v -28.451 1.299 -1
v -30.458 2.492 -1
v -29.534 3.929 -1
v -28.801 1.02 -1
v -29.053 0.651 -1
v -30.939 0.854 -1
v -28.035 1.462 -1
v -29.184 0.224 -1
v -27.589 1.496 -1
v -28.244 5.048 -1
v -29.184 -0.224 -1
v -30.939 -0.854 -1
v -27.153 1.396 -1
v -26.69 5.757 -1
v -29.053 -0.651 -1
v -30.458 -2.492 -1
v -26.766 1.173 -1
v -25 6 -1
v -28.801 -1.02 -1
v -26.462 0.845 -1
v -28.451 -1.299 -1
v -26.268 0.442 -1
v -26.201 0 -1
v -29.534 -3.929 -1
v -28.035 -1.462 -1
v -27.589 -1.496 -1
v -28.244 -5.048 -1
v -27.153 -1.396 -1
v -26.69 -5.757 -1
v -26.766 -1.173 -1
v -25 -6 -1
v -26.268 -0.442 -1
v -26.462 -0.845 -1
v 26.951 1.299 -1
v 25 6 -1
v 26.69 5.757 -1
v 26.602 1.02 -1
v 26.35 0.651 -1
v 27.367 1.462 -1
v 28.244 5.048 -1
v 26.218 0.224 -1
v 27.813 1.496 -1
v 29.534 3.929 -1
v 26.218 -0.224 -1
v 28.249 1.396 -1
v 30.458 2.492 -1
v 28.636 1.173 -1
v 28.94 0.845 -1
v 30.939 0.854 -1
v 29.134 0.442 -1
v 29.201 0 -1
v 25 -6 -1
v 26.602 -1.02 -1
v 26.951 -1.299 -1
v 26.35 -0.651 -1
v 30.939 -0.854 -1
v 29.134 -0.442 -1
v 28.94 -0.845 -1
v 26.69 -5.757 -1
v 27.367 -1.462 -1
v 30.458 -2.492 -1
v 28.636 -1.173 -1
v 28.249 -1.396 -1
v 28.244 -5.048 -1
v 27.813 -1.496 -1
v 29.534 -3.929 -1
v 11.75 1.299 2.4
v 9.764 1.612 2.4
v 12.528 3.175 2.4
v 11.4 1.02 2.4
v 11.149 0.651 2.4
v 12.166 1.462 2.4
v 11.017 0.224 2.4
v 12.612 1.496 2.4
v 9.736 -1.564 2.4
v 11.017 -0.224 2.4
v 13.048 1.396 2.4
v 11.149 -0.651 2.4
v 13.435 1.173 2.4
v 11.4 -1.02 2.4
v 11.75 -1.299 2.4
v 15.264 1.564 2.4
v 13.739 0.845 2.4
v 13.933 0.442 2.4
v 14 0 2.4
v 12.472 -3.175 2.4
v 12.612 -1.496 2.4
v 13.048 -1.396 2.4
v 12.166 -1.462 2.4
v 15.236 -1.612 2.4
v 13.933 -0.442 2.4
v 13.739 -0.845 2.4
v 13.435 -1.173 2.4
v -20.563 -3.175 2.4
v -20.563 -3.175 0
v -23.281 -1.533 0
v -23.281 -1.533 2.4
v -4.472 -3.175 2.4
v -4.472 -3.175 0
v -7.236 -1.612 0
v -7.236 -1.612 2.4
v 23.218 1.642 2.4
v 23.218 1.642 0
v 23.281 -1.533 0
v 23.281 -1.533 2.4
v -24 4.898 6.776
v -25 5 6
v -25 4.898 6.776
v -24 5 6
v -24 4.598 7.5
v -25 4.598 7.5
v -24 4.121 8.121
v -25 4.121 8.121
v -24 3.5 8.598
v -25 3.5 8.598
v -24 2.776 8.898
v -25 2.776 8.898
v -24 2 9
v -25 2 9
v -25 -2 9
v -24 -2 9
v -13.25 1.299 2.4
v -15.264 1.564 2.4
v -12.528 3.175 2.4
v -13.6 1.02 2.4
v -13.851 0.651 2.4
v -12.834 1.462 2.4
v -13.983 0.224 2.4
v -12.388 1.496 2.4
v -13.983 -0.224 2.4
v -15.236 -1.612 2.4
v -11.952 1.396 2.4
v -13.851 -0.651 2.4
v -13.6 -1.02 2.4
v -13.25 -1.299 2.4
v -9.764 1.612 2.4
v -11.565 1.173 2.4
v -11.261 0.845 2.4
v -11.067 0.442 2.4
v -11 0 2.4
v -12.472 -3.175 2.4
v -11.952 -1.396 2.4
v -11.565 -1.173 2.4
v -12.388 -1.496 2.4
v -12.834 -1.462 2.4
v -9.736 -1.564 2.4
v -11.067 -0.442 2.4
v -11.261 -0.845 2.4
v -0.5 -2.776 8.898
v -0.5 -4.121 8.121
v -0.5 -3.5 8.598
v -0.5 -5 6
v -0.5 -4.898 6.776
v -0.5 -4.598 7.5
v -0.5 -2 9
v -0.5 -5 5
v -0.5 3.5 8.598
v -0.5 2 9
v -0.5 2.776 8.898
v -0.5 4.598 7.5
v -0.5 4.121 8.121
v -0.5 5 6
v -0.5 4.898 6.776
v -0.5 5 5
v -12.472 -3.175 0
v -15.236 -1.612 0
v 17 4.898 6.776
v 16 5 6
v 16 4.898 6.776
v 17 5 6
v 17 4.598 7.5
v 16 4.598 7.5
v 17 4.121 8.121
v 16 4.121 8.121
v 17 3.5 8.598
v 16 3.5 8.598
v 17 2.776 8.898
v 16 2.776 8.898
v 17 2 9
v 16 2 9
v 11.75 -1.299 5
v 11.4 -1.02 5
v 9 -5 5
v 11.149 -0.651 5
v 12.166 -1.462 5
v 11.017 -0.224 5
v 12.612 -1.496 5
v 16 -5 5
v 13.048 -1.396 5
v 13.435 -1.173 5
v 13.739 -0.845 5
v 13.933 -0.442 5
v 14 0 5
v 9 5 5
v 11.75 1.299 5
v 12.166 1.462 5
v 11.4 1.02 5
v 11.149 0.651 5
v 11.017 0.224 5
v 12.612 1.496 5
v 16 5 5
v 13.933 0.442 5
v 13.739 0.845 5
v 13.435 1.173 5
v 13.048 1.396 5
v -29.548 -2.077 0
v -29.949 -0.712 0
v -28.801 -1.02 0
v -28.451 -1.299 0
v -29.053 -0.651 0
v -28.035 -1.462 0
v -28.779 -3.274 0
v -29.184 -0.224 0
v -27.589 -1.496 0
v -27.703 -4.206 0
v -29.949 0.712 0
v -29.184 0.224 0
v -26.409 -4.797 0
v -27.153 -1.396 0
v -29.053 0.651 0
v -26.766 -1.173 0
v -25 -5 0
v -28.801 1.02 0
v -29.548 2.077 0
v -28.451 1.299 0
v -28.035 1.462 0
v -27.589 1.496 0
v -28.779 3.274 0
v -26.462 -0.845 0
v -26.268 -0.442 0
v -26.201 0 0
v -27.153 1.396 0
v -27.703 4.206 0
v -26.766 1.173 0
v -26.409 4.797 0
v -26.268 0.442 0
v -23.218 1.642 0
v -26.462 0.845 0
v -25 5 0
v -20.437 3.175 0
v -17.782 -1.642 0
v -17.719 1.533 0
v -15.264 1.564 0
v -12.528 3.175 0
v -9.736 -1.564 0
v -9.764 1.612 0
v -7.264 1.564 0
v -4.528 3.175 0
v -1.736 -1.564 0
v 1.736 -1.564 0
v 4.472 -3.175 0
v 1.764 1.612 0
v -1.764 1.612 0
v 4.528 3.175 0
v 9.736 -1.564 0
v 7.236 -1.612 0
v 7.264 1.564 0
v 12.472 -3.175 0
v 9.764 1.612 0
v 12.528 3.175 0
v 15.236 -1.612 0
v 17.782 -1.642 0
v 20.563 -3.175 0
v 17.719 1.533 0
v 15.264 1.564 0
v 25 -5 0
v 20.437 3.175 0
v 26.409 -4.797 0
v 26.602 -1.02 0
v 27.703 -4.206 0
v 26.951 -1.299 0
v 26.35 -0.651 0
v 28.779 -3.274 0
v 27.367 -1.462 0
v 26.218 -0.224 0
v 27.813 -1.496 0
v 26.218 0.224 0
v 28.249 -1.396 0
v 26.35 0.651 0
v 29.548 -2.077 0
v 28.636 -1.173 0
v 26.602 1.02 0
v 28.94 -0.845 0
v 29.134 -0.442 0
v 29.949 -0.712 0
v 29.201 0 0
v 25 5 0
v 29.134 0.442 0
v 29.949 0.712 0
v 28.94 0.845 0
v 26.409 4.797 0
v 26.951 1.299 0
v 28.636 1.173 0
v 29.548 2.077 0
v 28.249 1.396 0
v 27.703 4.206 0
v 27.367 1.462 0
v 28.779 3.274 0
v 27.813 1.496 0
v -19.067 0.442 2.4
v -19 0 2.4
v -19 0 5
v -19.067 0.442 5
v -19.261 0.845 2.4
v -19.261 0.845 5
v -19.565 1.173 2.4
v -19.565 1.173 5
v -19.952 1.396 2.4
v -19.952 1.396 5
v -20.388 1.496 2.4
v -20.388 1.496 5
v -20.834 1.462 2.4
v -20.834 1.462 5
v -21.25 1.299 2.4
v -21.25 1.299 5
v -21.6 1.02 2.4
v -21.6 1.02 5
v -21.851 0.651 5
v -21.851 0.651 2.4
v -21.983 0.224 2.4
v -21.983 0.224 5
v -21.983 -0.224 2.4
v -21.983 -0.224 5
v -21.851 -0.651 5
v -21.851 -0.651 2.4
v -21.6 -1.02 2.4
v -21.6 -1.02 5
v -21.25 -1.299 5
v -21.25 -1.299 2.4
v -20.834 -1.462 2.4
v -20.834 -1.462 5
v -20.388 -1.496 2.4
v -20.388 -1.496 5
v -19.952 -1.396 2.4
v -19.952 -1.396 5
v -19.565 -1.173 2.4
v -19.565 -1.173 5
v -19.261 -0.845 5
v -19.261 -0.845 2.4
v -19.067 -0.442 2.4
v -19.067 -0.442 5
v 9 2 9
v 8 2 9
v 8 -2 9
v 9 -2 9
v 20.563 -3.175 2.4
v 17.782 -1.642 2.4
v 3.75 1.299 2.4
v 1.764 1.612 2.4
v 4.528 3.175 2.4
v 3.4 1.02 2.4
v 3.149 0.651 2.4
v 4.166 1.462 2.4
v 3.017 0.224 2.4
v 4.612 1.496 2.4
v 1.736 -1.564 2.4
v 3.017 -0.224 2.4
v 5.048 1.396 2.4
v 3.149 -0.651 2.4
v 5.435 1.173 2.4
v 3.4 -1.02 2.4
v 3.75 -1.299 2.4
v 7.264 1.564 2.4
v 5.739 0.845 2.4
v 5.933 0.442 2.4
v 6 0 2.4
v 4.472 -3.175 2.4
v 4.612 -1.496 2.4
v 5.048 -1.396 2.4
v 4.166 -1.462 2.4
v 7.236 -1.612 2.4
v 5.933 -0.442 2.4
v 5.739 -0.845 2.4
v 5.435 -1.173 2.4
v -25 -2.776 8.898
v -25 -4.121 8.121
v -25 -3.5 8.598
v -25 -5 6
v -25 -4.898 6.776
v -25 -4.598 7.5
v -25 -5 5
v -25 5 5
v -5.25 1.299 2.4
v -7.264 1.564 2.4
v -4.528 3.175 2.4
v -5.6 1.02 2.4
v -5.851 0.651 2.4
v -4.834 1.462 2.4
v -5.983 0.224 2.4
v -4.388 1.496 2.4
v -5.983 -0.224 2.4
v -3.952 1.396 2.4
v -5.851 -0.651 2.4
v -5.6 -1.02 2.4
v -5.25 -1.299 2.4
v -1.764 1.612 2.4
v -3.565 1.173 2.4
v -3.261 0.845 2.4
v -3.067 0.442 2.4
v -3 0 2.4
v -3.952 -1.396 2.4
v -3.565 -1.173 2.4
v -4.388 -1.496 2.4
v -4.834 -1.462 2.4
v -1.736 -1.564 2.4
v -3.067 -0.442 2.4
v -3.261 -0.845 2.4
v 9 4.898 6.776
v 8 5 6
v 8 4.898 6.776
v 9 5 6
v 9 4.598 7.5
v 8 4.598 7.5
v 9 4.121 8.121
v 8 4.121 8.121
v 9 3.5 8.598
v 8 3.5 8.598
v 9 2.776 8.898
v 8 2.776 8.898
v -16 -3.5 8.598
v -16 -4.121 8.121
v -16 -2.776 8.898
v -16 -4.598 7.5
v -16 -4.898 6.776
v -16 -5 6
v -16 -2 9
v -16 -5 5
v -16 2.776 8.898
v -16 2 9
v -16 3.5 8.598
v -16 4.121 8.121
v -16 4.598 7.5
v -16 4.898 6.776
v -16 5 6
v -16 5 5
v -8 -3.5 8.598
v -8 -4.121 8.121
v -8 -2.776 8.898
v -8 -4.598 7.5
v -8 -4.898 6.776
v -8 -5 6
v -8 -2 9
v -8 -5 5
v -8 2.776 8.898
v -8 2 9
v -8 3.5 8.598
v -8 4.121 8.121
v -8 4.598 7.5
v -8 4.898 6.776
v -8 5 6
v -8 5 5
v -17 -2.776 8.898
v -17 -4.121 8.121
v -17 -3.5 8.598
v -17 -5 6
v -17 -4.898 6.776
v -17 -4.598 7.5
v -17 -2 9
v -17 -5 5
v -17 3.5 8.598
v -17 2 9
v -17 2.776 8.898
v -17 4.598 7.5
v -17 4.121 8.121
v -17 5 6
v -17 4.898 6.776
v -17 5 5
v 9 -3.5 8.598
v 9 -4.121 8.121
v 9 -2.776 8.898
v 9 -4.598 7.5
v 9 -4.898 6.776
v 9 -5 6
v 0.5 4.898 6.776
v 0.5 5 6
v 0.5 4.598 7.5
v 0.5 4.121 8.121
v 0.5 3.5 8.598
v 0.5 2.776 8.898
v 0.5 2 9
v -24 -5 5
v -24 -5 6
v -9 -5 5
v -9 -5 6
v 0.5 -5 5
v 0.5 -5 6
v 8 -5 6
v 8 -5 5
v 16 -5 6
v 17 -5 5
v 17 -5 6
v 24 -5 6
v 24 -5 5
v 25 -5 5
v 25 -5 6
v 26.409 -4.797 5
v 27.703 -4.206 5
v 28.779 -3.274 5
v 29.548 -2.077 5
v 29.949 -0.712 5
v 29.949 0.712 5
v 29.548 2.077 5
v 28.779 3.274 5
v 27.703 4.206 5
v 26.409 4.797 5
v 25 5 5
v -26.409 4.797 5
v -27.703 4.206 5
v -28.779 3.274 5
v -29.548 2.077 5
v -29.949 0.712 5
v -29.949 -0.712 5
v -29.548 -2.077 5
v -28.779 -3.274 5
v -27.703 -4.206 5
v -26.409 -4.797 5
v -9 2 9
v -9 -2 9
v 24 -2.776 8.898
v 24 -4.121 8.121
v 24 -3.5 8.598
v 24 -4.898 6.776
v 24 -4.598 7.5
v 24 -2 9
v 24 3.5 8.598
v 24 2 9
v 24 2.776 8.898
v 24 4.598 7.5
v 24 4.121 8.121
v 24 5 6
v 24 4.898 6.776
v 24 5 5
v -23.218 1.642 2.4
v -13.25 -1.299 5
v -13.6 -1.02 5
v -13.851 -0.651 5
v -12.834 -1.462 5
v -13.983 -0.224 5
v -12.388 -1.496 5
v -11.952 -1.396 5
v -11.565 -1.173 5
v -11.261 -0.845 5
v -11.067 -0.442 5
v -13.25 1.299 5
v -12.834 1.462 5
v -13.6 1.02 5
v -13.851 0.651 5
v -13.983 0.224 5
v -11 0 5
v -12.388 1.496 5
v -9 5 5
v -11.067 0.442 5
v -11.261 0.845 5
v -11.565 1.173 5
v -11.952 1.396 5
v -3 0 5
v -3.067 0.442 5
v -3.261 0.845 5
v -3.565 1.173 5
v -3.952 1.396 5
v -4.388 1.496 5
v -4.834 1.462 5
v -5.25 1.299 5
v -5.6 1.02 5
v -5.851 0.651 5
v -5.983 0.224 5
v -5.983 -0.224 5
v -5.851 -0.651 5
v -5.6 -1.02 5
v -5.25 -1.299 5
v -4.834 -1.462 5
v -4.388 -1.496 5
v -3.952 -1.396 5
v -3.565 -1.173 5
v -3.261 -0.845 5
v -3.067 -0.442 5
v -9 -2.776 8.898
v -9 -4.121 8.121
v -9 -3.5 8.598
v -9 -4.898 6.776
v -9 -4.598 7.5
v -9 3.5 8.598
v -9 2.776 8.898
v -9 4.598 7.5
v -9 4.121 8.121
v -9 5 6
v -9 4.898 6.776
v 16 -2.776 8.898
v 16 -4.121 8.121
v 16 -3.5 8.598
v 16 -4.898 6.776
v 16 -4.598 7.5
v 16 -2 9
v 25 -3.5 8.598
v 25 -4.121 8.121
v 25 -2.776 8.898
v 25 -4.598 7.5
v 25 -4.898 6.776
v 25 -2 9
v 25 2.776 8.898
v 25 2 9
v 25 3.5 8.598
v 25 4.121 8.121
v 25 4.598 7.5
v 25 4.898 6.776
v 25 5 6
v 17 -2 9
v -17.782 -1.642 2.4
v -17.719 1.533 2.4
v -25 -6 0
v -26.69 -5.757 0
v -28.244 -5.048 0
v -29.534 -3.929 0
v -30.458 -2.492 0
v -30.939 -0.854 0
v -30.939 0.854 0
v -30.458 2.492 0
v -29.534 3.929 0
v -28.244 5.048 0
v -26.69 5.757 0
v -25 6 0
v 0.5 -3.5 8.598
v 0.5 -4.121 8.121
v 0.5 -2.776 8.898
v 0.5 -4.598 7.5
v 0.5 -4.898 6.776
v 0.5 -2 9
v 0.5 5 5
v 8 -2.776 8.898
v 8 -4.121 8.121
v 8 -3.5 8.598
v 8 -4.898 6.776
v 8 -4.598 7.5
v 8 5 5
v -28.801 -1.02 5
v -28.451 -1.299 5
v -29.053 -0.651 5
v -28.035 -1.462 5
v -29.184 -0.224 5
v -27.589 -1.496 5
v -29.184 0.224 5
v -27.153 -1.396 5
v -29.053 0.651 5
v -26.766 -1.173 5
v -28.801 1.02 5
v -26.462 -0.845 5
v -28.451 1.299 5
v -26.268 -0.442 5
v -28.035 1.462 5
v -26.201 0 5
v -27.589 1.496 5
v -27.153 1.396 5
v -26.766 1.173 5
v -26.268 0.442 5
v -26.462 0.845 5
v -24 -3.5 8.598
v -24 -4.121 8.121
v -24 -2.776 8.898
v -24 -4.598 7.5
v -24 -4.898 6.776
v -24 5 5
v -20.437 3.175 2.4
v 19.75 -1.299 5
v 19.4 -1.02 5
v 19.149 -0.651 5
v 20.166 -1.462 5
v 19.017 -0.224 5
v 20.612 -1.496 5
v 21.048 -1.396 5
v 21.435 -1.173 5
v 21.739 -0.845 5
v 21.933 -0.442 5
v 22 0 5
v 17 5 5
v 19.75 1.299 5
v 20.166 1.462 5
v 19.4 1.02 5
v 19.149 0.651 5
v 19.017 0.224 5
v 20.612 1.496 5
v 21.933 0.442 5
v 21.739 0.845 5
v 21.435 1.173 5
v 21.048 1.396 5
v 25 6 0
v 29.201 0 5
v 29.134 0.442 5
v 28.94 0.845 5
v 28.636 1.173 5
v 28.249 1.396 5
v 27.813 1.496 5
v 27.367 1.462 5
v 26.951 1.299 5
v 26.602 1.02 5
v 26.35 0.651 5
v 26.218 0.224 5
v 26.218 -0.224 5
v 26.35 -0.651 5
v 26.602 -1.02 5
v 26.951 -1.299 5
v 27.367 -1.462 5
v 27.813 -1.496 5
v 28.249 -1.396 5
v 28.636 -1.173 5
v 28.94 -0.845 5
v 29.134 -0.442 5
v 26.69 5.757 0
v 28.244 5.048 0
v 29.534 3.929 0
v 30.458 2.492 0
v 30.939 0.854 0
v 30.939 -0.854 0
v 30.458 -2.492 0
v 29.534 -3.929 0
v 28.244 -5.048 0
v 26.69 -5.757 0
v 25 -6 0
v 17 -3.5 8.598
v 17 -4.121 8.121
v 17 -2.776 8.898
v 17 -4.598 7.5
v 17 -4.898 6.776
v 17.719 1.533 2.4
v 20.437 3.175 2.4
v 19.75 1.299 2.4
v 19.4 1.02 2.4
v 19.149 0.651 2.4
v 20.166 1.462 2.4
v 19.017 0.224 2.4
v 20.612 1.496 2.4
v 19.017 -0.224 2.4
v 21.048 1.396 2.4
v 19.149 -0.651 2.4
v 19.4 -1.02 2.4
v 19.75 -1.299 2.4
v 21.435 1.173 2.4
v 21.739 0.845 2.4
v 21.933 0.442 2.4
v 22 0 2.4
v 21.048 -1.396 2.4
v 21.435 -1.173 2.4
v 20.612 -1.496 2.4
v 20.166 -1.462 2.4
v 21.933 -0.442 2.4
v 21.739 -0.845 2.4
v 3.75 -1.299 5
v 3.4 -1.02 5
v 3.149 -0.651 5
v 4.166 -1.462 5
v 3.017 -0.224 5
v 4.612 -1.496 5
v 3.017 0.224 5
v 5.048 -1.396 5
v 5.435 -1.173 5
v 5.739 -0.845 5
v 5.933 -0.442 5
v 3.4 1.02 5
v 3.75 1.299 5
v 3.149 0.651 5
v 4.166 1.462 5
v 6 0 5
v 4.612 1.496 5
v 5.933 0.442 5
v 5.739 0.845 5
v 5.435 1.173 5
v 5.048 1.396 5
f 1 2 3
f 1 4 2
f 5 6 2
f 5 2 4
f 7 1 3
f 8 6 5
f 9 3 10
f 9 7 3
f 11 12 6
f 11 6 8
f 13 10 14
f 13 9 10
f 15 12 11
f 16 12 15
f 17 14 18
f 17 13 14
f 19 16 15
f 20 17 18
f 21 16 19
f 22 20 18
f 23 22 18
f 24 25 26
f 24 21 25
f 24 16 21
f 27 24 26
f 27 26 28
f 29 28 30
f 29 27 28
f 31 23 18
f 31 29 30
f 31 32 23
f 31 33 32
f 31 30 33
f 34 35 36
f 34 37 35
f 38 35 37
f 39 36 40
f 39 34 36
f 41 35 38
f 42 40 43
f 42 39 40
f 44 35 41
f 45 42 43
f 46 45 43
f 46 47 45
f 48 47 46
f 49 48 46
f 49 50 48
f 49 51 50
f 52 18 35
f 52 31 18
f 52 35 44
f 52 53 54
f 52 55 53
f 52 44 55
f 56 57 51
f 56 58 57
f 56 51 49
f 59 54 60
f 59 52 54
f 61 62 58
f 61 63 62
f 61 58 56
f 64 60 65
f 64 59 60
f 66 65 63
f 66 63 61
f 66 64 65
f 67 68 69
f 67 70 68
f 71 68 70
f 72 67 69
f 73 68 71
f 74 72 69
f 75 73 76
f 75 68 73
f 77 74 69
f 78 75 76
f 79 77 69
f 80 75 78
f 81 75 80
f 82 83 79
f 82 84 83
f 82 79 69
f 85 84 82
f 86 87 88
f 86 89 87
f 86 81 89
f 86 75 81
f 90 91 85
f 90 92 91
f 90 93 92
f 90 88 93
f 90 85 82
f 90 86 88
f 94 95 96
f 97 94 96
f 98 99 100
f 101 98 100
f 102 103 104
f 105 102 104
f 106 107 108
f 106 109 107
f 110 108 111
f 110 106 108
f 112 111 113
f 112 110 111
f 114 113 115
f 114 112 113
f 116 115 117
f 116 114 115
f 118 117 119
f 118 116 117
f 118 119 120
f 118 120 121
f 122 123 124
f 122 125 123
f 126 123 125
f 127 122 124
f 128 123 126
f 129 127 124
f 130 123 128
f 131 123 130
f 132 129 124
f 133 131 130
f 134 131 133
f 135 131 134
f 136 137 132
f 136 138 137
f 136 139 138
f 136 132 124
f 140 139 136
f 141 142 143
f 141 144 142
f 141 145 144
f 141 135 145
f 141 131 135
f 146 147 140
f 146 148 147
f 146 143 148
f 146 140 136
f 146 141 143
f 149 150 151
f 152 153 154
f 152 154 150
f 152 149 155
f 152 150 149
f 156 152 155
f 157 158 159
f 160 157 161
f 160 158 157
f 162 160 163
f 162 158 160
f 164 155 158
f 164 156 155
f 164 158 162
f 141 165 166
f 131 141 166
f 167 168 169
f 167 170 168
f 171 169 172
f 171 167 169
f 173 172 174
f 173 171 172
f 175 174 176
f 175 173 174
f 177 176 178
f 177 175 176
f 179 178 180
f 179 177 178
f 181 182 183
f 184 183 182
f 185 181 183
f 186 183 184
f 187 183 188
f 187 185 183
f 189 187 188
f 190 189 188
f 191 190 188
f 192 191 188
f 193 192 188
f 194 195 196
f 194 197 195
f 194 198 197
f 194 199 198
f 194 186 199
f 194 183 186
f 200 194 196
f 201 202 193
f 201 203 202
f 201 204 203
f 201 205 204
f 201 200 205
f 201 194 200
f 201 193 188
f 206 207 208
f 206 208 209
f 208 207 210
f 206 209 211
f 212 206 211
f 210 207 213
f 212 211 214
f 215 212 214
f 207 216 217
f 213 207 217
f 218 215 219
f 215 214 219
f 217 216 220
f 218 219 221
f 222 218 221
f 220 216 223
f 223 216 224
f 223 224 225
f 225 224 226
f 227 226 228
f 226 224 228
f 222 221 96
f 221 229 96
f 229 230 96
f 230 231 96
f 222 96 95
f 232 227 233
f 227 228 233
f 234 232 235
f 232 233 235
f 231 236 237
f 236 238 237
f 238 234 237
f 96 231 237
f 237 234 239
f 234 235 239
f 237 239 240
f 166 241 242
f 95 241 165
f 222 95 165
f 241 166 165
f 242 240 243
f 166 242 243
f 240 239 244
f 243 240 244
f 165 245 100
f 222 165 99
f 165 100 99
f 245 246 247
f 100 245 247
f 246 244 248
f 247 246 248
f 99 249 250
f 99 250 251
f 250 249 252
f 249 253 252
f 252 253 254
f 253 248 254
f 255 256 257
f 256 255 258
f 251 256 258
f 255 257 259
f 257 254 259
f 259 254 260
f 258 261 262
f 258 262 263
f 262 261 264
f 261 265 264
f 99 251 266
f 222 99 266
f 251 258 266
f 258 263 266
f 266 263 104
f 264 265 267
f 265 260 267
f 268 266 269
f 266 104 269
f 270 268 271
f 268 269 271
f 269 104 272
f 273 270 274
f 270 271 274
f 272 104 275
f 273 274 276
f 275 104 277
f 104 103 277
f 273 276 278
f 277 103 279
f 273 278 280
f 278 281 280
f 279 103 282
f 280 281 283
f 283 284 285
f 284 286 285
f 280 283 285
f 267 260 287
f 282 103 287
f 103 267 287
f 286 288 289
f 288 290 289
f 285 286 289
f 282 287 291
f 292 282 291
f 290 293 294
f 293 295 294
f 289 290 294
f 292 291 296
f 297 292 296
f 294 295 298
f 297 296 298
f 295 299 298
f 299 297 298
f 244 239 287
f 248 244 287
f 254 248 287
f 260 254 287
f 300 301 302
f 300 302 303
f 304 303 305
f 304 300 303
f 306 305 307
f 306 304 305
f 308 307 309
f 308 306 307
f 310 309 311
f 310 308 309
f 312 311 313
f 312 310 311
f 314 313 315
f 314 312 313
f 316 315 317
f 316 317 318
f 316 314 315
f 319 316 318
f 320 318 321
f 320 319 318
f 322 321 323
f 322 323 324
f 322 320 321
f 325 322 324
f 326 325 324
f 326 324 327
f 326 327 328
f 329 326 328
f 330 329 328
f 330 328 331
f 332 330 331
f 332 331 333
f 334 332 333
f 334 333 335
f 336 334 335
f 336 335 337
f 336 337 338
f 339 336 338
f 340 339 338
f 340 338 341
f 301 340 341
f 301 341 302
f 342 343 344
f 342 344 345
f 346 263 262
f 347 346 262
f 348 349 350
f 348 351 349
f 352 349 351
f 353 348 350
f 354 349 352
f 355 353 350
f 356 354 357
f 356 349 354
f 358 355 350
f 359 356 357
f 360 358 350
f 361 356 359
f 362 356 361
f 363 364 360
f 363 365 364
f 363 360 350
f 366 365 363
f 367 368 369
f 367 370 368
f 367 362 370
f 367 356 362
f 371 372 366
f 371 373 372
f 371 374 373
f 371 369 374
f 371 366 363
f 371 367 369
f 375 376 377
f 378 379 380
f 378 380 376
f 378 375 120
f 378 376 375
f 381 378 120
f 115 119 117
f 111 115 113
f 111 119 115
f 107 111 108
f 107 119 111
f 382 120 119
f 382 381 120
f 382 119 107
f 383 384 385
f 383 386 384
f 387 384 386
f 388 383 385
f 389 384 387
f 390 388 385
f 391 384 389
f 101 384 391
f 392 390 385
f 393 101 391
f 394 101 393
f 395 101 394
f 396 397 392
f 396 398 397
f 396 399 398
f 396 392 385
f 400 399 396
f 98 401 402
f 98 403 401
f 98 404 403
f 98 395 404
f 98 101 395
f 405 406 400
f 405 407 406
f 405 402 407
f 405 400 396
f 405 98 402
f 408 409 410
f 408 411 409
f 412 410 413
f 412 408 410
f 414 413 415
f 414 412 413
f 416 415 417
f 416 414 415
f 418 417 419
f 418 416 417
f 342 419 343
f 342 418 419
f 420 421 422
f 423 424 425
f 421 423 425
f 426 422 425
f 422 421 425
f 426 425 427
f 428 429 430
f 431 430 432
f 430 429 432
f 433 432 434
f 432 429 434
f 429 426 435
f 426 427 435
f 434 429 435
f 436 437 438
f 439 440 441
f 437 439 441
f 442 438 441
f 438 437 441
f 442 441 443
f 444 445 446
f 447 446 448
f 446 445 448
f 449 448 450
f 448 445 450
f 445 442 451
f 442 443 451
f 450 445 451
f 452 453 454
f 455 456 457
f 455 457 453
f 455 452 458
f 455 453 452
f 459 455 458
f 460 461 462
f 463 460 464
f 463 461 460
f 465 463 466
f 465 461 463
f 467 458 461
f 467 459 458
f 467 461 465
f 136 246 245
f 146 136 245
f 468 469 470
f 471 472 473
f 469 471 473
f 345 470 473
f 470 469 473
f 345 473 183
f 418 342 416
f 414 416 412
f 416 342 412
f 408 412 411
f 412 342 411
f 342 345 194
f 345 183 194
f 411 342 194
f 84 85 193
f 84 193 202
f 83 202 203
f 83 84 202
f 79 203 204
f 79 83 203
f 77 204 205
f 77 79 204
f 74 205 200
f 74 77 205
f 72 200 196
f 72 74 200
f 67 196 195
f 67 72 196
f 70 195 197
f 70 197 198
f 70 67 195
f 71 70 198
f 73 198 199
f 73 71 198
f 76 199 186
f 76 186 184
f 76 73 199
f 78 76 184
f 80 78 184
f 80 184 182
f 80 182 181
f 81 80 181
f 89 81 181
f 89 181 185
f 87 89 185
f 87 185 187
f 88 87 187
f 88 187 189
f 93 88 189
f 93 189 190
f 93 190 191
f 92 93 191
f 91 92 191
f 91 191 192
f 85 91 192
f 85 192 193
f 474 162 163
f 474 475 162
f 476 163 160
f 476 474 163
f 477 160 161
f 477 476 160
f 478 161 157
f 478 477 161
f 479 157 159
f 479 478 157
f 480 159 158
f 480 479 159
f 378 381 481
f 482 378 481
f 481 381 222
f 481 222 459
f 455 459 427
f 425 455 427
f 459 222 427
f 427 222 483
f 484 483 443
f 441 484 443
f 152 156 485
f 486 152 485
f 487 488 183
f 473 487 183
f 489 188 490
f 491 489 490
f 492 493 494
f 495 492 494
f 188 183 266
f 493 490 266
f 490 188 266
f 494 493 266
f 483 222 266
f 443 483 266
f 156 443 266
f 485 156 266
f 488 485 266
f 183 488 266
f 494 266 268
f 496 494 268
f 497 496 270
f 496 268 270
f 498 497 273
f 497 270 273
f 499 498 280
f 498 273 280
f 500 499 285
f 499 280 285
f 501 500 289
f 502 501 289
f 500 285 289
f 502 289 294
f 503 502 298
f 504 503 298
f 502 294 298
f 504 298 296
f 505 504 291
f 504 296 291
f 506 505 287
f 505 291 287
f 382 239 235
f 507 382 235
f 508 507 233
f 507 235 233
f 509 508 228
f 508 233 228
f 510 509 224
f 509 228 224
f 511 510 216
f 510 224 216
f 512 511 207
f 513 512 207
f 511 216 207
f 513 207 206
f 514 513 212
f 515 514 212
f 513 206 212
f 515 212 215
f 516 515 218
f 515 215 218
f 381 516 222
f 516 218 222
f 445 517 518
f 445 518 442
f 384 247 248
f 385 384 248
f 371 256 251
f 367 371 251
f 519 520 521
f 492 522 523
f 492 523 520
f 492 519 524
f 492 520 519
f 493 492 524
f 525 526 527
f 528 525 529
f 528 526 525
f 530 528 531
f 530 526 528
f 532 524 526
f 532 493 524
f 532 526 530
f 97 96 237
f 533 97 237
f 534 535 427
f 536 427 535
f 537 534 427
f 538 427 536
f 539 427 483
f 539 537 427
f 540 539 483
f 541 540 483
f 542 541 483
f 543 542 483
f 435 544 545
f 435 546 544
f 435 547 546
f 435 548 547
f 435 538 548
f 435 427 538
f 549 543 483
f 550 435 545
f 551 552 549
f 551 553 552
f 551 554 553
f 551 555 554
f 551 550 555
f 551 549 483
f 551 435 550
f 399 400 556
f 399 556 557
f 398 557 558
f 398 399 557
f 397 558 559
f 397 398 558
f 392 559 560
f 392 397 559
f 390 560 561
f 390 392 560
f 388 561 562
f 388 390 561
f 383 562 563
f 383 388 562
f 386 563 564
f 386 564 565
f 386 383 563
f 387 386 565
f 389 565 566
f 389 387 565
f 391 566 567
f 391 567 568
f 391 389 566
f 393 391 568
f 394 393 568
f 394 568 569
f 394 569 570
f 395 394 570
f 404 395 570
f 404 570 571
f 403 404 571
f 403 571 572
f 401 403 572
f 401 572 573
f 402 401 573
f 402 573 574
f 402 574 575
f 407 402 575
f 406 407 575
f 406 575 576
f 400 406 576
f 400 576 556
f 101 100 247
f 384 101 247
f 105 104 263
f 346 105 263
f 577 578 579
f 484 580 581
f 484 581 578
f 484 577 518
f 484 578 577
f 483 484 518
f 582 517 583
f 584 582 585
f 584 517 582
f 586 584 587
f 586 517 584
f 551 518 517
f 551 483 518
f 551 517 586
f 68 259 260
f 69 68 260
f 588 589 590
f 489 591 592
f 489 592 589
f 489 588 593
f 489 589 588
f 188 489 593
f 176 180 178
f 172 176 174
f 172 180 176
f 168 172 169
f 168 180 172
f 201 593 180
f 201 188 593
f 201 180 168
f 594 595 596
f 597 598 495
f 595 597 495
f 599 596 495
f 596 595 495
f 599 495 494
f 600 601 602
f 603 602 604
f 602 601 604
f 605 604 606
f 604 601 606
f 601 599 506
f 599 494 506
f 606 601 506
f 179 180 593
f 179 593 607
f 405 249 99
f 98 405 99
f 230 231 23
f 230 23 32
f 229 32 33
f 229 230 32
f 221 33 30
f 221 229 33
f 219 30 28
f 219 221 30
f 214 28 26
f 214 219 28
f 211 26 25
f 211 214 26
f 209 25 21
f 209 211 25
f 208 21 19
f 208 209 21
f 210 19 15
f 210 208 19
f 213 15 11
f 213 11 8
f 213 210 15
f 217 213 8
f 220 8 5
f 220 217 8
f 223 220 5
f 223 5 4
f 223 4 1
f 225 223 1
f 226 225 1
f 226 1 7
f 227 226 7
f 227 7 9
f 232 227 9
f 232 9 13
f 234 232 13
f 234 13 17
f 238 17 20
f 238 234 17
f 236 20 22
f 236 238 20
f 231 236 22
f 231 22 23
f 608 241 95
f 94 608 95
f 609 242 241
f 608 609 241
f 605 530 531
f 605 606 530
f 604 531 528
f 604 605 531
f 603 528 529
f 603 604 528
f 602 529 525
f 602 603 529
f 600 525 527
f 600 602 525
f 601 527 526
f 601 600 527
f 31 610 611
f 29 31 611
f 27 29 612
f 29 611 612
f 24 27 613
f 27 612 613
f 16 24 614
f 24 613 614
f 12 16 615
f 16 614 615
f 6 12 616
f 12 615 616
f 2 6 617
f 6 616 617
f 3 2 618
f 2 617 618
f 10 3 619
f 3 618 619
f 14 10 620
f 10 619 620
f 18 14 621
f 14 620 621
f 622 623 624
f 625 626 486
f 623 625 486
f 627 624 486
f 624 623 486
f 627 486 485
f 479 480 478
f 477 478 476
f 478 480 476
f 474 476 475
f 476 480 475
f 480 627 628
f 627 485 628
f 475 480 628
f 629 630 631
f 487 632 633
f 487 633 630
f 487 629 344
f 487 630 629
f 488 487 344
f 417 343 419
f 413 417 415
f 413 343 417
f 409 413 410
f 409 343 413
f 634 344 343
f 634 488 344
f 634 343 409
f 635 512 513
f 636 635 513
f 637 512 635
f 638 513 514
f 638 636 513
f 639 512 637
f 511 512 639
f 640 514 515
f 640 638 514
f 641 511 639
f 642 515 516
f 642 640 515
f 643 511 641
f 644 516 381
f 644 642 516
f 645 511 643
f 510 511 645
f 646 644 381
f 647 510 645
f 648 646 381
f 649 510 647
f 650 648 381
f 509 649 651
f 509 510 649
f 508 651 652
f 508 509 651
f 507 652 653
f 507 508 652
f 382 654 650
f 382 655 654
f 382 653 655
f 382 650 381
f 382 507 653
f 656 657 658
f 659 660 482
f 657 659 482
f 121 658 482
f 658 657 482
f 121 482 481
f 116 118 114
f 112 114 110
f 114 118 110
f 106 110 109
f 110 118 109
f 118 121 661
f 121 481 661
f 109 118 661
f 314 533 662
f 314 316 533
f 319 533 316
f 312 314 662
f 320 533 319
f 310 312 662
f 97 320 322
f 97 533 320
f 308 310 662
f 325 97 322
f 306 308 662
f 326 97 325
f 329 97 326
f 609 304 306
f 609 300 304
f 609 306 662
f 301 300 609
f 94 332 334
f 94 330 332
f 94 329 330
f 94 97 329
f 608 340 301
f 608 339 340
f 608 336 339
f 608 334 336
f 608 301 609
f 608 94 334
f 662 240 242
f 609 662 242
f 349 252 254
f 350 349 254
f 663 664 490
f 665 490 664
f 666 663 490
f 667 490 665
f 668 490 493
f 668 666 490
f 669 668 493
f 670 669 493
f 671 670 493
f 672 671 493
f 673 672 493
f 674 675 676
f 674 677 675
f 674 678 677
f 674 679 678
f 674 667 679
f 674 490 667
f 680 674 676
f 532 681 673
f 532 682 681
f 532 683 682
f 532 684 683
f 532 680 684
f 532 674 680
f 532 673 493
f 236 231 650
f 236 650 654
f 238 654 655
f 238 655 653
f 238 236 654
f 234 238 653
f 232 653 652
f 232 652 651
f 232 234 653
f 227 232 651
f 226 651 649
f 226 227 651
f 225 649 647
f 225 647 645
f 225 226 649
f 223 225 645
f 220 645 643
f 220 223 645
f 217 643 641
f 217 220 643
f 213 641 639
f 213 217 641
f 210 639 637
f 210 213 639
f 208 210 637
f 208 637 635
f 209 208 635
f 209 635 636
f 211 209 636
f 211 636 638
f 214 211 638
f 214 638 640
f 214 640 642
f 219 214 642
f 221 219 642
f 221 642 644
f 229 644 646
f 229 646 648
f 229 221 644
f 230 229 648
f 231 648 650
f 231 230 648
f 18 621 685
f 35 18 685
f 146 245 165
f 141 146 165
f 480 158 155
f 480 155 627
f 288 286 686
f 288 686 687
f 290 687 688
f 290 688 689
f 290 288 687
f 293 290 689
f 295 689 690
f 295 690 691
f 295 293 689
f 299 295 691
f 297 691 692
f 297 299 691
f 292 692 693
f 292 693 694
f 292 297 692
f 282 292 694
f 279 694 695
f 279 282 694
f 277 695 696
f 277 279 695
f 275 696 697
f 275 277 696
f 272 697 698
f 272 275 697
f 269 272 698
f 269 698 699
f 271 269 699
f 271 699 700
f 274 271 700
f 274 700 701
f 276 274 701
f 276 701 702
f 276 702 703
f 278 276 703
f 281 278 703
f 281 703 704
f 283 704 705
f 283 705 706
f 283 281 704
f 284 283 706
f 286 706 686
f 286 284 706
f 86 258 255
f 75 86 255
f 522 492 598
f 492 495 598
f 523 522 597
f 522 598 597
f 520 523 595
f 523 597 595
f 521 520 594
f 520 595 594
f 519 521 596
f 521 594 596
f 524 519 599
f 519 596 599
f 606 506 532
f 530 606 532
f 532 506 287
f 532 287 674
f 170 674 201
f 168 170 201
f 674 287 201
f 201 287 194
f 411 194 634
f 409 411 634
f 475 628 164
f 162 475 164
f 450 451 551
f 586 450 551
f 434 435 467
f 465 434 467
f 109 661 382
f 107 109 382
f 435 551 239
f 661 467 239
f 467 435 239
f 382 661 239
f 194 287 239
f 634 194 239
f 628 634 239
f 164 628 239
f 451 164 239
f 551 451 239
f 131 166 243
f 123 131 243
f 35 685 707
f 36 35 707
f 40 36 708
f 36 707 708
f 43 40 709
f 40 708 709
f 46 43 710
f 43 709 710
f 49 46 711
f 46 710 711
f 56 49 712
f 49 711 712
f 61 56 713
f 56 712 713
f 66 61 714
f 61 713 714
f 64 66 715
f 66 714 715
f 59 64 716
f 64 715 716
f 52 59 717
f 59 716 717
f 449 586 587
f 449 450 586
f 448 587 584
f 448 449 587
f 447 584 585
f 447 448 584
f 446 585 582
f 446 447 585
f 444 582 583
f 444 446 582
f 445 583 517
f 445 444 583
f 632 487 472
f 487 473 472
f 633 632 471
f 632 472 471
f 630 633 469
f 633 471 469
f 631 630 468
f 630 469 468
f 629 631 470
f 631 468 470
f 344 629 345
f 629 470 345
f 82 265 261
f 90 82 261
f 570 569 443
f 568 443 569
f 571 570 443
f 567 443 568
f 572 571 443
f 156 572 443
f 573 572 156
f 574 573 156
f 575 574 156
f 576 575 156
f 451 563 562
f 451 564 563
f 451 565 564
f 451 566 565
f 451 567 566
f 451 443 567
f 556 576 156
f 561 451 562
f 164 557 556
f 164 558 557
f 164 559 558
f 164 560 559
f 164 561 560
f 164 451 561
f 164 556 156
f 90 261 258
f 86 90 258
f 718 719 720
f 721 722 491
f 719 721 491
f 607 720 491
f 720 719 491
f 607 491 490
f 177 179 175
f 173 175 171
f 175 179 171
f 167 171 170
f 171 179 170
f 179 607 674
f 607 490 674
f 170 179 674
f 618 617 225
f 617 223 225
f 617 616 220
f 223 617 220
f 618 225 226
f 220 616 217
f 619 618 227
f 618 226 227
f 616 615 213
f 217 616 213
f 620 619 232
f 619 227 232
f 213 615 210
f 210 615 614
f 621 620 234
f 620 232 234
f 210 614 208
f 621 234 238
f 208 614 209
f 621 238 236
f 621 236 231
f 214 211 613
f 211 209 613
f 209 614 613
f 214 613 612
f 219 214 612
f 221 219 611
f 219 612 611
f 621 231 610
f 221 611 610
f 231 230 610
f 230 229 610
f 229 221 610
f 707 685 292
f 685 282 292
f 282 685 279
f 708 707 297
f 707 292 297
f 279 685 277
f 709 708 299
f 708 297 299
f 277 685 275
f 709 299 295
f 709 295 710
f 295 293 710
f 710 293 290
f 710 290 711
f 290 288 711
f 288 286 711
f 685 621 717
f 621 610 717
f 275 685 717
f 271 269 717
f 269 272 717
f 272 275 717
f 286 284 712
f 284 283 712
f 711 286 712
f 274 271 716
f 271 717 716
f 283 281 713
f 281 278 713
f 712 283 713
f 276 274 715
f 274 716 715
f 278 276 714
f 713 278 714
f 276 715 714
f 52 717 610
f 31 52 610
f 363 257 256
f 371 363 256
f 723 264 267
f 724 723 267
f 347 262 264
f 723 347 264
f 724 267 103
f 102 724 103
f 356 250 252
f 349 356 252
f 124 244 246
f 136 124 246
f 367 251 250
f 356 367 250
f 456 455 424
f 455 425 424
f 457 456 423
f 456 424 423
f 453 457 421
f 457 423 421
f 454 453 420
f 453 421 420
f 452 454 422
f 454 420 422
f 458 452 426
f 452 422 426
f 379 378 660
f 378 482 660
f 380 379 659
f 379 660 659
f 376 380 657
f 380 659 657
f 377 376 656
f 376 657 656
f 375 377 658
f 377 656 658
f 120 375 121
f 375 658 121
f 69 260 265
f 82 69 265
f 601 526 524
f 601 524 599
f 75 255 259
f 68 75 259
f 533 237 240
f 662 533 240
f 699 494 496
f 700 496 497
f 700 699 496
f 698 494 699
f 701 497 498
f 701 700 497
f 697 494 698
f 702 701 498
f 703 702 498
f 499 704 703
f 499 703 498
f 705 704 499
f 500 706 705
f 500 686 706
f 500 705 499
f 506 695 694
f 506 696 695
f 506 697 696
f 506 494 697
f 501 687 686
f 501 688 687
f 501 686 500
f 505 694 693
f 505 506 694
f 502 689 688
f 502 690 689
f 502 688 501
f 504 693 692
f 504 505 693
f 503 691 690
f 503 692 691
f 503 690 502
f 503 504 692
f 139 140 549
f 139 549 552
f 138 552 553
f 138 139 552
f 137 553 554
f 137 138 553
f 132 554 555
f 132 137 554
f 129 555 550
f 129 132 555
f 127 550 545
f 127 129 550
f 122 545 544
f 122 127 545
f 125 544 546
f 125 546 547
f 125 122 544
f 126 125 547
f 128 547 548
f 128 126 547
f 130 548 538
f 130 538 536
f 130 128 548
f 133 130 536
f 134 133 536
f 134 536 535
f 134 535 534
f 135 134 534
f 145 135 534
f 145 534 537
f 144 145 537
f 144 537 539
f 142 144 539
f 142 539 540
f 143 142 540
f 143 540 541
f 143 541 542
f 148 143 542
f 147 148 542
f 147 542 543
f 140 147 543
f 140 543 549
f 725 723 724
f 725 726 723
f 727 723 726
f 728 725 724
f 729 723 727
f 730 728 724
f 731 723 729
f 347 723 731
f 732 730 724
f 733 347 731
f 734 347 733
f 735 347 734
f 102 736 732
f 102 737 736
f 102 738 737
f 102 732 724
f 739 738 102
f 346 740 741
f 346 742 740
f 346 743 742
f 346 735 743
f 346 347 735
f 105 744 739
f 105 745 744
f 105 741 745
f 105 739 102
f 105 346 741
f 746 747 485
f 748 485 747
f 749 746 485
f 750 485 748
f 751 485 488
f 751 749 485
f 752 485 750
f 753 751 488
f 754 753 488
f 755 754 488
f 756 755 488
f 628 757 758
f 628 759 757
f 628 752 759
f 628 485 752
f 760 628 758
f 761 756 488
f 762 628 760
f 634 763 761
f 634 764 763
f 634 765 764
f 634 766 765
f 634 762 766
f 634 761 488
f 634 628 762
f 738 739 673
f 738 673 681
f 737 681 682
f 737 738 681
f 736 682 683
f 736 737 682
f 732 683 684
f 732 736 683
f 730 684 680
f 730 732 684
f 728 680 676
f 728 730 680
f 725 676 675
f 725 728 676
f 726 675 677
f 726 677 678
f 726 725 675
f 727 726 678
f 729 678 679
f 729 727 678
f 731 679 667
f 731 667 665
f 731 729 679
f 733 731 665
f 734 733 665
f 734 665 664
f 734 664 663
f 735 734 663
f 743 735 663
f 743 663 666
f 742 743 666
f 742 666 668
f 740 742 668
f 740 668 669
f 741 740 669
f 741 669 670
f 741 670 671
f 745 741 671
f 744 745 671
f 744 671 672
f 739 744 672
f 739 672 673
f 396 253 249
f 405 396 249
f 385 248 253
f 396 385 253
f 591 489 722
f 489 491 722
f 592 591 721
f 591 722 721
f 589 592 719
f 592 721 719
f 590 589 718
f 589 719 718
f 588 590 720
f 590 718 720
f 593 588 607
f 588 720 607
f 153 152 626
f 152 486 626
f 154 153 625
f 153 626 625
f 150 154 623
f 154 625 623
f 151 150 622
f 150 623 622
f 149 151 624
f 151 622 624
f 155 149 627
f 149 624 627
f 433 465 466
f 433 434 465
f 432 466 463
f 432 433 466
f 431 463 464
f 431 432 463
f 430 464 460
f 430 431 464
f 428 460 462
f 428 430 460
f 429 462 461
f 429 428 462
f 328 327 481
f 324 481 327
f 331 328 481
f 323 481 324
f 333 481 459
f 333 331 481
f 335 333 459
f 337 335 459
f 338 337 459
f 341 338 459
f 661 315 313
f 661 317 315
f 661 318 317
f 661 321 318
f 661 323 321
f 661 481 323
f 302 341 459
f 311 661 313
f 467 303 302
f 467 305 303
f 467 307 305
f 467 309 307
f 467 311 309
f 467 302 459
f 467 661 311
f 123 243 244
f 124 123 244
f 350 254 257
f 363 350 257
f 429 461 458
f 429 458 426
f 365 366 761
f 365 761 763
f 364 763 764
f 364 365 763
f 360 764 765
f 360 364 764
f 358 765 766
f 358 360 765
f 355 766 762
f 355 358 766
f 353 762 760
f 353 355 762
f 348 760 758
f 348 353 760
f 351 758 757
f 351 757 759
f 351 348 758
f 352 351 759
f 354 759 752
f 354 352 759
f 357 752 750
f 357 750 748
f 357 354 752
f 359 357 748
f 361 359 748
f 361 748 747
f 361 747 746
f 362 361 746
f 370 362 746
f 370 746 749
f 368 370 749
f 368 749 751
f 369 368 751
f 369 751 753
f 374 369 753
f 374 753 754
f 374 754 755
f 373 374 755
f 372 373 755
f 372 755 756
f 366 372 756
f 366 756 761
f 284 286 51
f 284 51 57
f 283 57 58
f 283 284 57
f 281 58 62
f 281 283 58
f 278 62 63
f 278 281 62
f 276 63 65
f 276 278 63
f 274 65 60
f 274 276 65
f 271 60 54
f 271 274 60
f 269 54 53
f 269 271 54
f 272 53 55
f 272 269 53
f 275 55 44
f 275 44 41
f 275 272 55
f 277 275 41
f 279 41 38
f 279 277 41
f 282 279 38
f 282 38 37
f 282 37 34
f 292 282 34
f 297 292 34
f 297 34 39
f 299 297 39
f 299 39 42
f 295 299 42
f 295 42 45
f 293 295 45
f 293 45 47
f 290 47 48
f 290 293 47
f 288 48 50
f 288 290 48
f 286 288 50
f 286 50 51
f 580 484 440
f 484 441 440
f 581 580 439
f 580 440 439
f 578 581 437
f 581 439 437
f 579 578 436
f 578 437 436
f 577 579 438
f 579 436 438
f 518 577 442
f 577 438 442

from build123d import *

# Parameters (mm, degrees)
F0_R     = 1.5
F0_W     = 1
F0_H     = 10
F0_W_2   = 7
F0_W_3   = 7.5
F1_DEPTH = 5
F2_DEPTH = 9
F3_R     = 3
F5_DEPTH = 2.4
F6_R     = 1.5
F7_DEPTH = 1


with BuildPart() as f1:
    # F0 (on Top) → F1 (new body)
    with BuildSketch(Plane.XY):
        with BuildLine():
            Line((25, 5), (25, -5))
            ThreePointArc((25, -5), (30, 0), (25, 5))
        make_face()
        with Locations((27.7011040598, 0)):
            Circle(F0_R, mode=Mode.SUBTRACT)
        with Locations((24.5, 0)):
            Rectangle(F0_W, F0_H)
        with Locations((20.5, 0)):
            Rectangle(F0_W_2, F0_H)
        with Locations((20.5, 0)):
            Circle(F0_R, mode=Mode.SUBTRACT)
        with Locations((16.5, 0)):
            Rectangle(F0_W, F0_H)
        with Locations((12.5, 0)):
            Rectangle(F0_W_2, F0_H)
        with Locations((12.5, 0)):
            Circle(F0_R, mode=Mode.SUBTRACT)
        with Locations((8.5, 0)):
            Rectangle(F0_W, F0_H)
        with Locations((4.25, 0)):
            Rectangle(F0_W_3, F0_H)
        with Locations((4.5, 0)):
            Circle(F0_R, mode=Mode.SUBTRACT)
        Rectangle(F0_W, F0_H)
        with Locations((-4.25, 0)):
            Rectangle(F0_W_3, F0_H)
        with Locations((-4.5, 0)):
            Circle(F0_R, mode=Mode.SUBTRACT)
        with Locations((-8.5, 0)):
            Rectangle(F0_W, F0_H)
        with Locations((-12.5, 0)):
            Rectangle(F0_W_2, F0_H)
        with Locations((-12.5, 0)):
            Circle(F0_R, mode=Mode.SUBTRACT)
        with Locations((-16.5, 0)):
            Rectangle(F0_W, F0_H)
        with Locations((-20.5, 0)):
            Rectangle(F0_W_2, F0_H)
        with Locations((-20.5, 0)):
            Circle(F0_R, mode=Mode.SUBTRACT)
        with Locations((-24.5, 0)):
            Rectangle(F0_W, F0_H)
        with BuildLine():
            ThreePointArc((-25, 5), (-30, 0), (-25, -5))
            Line((-25, -5), (-25, 5))
        make_face()
        with Locations((-27.7011040598, 0)):
            Circle(F0_R, mode=Mode.SUBTRACT)
    extrude(amount=F1_DEPTH)

    # F0 (on Top) → F2 (join)
    with BuildSketch(Plane.XY):
        with Locations((-24.5, 0)):
            Rectangle(F0_W, F0_H)
        with Locations((-16.5, 0)):
            Rectangle(F0_W, F0_H)
        with Locations((-8.5, 0)):
            Rectangle(F0_W, F0_H)
        Rectangle(F0_W, F0_H)
        with Locations((8.5, 0)):
            Rectangle(F0_W, F0_H)
        with Locations((16.5, 0)):
            Rectangle(F0_W, F0_H)
        with Locations((24.5, 0)):
            Rectangle(F0_W, F0_H)
    extrude(amount=F2_DEPTH)

    # F3
    f3_edges = [f1.edges().sort_by_distance(p)[0] for p in [
        (-24.5, -5, 9),
        (-16.5, -5, 9),
        (-8.5, -5, 9),
        (0, -5, 9),
        (8.5, -5, 9),
        (16.5, -5, 9),
        (24.5, -5, 9),
        (24.5, 5, 9),
        (16.5, 5, 9),
        (8.5, 5, 9),
        (0, 5, 9),
        (-8.5, 5, 9),
        (-16.5, 5, 9),
        (-24.5, 5, 9),
    ]]
    fillet(f3_edges, radius=F3_R)

    # F4 (on face) → F5 (cut)
    with BuildSketch(Plane(origin=(0, 0, 0), x_dir=(1, 0, 0), z_dir=(0, 0, -1))):
        Polygon((-20.4367463733, -3.1747964206), (-17.7189188346, -1.5326189627), (-17.7821724613, 1.6421774579), (-20.5632536267, 3.1747964206), (-23.2810811654, 1.5326189627), (-23.2178275387, -1.6421774579), align=None)
        Polygon((-12.5275420892, -3.175307035), (-9.7638744875, -1.6115056665), (-9.7363323982, 1.5638013686), (-12.4724579108, 3.175307035), (-15.2361255125, 1.6115056665), (-15.2636676018, -1.5638013686), align=None)
        Polygon((-4.5275420892, -3.175307035), (-1.7638744875, -1.6115056665), (-1.7363323982, 1.5638013686), (-4.4724579108, 3.175307035), (-7.2361255125, 1.6115056665), (-7.2636676018, -1.5638013686), align=None)
        Polygon((23.2178275387, -1.6421774579), (23.2810811654, 1.5326189627), (20.5632536267, 3.1747964206), (17.7821724613, 1.6421774579), (17.7189188346, -1.5326189627), (20.4367463733, -3.1747964206), align=None)
        Polygon((15.2636676018, -1.5638013686), (15.2361255125, 1.6115056665), (12.4724579108, 3.175307035), (9.7363323982, 1.5638013686), (9.7638744875, -1.6115056665), (12.5275420892, -3.175307035), align=None)
        Polygon((7.2636676018, -1.5638013686), (7.2361255125, 1.6115056665), (4.4724579108, 3.175307035), (1.7363323982, 1.5638013686), (1.7638744875, -1.6115056665), (4.5275420892, -3.175307035), align=None)
    extrude(amount=-F5_DEPTH, mode=Mode.SUBTRACT)


with BuildPart() as f7:
    # F6 (on face) → F7 (new body)
    with BuildSketch(Plane(origin=(0, 0, 0), x_dir=(1, 0, 0), z_dir=(0, 0, -1))):
        with BuildLine():
            ThreePointArc((25, -6), (31, 0), (25, 6))
            Line((25, 6), (-25, 6))
            ThreePointArc((-25, 6), (-31, 0), (-25, -6))
            Line((-25, -6), (25, -6))
        make_face()
        with Locations((-27.7011040598, 0)):
            Circle(F6_R, mode=Mode.SUBTRACT)
        with Locations((27.7011040598, 0)):
            Circle(F6_R, mode=Mode.SUBTRACT)
    extrude(amount=F7_DEPTH)


solid = Compound([f1.part, f7.part])
